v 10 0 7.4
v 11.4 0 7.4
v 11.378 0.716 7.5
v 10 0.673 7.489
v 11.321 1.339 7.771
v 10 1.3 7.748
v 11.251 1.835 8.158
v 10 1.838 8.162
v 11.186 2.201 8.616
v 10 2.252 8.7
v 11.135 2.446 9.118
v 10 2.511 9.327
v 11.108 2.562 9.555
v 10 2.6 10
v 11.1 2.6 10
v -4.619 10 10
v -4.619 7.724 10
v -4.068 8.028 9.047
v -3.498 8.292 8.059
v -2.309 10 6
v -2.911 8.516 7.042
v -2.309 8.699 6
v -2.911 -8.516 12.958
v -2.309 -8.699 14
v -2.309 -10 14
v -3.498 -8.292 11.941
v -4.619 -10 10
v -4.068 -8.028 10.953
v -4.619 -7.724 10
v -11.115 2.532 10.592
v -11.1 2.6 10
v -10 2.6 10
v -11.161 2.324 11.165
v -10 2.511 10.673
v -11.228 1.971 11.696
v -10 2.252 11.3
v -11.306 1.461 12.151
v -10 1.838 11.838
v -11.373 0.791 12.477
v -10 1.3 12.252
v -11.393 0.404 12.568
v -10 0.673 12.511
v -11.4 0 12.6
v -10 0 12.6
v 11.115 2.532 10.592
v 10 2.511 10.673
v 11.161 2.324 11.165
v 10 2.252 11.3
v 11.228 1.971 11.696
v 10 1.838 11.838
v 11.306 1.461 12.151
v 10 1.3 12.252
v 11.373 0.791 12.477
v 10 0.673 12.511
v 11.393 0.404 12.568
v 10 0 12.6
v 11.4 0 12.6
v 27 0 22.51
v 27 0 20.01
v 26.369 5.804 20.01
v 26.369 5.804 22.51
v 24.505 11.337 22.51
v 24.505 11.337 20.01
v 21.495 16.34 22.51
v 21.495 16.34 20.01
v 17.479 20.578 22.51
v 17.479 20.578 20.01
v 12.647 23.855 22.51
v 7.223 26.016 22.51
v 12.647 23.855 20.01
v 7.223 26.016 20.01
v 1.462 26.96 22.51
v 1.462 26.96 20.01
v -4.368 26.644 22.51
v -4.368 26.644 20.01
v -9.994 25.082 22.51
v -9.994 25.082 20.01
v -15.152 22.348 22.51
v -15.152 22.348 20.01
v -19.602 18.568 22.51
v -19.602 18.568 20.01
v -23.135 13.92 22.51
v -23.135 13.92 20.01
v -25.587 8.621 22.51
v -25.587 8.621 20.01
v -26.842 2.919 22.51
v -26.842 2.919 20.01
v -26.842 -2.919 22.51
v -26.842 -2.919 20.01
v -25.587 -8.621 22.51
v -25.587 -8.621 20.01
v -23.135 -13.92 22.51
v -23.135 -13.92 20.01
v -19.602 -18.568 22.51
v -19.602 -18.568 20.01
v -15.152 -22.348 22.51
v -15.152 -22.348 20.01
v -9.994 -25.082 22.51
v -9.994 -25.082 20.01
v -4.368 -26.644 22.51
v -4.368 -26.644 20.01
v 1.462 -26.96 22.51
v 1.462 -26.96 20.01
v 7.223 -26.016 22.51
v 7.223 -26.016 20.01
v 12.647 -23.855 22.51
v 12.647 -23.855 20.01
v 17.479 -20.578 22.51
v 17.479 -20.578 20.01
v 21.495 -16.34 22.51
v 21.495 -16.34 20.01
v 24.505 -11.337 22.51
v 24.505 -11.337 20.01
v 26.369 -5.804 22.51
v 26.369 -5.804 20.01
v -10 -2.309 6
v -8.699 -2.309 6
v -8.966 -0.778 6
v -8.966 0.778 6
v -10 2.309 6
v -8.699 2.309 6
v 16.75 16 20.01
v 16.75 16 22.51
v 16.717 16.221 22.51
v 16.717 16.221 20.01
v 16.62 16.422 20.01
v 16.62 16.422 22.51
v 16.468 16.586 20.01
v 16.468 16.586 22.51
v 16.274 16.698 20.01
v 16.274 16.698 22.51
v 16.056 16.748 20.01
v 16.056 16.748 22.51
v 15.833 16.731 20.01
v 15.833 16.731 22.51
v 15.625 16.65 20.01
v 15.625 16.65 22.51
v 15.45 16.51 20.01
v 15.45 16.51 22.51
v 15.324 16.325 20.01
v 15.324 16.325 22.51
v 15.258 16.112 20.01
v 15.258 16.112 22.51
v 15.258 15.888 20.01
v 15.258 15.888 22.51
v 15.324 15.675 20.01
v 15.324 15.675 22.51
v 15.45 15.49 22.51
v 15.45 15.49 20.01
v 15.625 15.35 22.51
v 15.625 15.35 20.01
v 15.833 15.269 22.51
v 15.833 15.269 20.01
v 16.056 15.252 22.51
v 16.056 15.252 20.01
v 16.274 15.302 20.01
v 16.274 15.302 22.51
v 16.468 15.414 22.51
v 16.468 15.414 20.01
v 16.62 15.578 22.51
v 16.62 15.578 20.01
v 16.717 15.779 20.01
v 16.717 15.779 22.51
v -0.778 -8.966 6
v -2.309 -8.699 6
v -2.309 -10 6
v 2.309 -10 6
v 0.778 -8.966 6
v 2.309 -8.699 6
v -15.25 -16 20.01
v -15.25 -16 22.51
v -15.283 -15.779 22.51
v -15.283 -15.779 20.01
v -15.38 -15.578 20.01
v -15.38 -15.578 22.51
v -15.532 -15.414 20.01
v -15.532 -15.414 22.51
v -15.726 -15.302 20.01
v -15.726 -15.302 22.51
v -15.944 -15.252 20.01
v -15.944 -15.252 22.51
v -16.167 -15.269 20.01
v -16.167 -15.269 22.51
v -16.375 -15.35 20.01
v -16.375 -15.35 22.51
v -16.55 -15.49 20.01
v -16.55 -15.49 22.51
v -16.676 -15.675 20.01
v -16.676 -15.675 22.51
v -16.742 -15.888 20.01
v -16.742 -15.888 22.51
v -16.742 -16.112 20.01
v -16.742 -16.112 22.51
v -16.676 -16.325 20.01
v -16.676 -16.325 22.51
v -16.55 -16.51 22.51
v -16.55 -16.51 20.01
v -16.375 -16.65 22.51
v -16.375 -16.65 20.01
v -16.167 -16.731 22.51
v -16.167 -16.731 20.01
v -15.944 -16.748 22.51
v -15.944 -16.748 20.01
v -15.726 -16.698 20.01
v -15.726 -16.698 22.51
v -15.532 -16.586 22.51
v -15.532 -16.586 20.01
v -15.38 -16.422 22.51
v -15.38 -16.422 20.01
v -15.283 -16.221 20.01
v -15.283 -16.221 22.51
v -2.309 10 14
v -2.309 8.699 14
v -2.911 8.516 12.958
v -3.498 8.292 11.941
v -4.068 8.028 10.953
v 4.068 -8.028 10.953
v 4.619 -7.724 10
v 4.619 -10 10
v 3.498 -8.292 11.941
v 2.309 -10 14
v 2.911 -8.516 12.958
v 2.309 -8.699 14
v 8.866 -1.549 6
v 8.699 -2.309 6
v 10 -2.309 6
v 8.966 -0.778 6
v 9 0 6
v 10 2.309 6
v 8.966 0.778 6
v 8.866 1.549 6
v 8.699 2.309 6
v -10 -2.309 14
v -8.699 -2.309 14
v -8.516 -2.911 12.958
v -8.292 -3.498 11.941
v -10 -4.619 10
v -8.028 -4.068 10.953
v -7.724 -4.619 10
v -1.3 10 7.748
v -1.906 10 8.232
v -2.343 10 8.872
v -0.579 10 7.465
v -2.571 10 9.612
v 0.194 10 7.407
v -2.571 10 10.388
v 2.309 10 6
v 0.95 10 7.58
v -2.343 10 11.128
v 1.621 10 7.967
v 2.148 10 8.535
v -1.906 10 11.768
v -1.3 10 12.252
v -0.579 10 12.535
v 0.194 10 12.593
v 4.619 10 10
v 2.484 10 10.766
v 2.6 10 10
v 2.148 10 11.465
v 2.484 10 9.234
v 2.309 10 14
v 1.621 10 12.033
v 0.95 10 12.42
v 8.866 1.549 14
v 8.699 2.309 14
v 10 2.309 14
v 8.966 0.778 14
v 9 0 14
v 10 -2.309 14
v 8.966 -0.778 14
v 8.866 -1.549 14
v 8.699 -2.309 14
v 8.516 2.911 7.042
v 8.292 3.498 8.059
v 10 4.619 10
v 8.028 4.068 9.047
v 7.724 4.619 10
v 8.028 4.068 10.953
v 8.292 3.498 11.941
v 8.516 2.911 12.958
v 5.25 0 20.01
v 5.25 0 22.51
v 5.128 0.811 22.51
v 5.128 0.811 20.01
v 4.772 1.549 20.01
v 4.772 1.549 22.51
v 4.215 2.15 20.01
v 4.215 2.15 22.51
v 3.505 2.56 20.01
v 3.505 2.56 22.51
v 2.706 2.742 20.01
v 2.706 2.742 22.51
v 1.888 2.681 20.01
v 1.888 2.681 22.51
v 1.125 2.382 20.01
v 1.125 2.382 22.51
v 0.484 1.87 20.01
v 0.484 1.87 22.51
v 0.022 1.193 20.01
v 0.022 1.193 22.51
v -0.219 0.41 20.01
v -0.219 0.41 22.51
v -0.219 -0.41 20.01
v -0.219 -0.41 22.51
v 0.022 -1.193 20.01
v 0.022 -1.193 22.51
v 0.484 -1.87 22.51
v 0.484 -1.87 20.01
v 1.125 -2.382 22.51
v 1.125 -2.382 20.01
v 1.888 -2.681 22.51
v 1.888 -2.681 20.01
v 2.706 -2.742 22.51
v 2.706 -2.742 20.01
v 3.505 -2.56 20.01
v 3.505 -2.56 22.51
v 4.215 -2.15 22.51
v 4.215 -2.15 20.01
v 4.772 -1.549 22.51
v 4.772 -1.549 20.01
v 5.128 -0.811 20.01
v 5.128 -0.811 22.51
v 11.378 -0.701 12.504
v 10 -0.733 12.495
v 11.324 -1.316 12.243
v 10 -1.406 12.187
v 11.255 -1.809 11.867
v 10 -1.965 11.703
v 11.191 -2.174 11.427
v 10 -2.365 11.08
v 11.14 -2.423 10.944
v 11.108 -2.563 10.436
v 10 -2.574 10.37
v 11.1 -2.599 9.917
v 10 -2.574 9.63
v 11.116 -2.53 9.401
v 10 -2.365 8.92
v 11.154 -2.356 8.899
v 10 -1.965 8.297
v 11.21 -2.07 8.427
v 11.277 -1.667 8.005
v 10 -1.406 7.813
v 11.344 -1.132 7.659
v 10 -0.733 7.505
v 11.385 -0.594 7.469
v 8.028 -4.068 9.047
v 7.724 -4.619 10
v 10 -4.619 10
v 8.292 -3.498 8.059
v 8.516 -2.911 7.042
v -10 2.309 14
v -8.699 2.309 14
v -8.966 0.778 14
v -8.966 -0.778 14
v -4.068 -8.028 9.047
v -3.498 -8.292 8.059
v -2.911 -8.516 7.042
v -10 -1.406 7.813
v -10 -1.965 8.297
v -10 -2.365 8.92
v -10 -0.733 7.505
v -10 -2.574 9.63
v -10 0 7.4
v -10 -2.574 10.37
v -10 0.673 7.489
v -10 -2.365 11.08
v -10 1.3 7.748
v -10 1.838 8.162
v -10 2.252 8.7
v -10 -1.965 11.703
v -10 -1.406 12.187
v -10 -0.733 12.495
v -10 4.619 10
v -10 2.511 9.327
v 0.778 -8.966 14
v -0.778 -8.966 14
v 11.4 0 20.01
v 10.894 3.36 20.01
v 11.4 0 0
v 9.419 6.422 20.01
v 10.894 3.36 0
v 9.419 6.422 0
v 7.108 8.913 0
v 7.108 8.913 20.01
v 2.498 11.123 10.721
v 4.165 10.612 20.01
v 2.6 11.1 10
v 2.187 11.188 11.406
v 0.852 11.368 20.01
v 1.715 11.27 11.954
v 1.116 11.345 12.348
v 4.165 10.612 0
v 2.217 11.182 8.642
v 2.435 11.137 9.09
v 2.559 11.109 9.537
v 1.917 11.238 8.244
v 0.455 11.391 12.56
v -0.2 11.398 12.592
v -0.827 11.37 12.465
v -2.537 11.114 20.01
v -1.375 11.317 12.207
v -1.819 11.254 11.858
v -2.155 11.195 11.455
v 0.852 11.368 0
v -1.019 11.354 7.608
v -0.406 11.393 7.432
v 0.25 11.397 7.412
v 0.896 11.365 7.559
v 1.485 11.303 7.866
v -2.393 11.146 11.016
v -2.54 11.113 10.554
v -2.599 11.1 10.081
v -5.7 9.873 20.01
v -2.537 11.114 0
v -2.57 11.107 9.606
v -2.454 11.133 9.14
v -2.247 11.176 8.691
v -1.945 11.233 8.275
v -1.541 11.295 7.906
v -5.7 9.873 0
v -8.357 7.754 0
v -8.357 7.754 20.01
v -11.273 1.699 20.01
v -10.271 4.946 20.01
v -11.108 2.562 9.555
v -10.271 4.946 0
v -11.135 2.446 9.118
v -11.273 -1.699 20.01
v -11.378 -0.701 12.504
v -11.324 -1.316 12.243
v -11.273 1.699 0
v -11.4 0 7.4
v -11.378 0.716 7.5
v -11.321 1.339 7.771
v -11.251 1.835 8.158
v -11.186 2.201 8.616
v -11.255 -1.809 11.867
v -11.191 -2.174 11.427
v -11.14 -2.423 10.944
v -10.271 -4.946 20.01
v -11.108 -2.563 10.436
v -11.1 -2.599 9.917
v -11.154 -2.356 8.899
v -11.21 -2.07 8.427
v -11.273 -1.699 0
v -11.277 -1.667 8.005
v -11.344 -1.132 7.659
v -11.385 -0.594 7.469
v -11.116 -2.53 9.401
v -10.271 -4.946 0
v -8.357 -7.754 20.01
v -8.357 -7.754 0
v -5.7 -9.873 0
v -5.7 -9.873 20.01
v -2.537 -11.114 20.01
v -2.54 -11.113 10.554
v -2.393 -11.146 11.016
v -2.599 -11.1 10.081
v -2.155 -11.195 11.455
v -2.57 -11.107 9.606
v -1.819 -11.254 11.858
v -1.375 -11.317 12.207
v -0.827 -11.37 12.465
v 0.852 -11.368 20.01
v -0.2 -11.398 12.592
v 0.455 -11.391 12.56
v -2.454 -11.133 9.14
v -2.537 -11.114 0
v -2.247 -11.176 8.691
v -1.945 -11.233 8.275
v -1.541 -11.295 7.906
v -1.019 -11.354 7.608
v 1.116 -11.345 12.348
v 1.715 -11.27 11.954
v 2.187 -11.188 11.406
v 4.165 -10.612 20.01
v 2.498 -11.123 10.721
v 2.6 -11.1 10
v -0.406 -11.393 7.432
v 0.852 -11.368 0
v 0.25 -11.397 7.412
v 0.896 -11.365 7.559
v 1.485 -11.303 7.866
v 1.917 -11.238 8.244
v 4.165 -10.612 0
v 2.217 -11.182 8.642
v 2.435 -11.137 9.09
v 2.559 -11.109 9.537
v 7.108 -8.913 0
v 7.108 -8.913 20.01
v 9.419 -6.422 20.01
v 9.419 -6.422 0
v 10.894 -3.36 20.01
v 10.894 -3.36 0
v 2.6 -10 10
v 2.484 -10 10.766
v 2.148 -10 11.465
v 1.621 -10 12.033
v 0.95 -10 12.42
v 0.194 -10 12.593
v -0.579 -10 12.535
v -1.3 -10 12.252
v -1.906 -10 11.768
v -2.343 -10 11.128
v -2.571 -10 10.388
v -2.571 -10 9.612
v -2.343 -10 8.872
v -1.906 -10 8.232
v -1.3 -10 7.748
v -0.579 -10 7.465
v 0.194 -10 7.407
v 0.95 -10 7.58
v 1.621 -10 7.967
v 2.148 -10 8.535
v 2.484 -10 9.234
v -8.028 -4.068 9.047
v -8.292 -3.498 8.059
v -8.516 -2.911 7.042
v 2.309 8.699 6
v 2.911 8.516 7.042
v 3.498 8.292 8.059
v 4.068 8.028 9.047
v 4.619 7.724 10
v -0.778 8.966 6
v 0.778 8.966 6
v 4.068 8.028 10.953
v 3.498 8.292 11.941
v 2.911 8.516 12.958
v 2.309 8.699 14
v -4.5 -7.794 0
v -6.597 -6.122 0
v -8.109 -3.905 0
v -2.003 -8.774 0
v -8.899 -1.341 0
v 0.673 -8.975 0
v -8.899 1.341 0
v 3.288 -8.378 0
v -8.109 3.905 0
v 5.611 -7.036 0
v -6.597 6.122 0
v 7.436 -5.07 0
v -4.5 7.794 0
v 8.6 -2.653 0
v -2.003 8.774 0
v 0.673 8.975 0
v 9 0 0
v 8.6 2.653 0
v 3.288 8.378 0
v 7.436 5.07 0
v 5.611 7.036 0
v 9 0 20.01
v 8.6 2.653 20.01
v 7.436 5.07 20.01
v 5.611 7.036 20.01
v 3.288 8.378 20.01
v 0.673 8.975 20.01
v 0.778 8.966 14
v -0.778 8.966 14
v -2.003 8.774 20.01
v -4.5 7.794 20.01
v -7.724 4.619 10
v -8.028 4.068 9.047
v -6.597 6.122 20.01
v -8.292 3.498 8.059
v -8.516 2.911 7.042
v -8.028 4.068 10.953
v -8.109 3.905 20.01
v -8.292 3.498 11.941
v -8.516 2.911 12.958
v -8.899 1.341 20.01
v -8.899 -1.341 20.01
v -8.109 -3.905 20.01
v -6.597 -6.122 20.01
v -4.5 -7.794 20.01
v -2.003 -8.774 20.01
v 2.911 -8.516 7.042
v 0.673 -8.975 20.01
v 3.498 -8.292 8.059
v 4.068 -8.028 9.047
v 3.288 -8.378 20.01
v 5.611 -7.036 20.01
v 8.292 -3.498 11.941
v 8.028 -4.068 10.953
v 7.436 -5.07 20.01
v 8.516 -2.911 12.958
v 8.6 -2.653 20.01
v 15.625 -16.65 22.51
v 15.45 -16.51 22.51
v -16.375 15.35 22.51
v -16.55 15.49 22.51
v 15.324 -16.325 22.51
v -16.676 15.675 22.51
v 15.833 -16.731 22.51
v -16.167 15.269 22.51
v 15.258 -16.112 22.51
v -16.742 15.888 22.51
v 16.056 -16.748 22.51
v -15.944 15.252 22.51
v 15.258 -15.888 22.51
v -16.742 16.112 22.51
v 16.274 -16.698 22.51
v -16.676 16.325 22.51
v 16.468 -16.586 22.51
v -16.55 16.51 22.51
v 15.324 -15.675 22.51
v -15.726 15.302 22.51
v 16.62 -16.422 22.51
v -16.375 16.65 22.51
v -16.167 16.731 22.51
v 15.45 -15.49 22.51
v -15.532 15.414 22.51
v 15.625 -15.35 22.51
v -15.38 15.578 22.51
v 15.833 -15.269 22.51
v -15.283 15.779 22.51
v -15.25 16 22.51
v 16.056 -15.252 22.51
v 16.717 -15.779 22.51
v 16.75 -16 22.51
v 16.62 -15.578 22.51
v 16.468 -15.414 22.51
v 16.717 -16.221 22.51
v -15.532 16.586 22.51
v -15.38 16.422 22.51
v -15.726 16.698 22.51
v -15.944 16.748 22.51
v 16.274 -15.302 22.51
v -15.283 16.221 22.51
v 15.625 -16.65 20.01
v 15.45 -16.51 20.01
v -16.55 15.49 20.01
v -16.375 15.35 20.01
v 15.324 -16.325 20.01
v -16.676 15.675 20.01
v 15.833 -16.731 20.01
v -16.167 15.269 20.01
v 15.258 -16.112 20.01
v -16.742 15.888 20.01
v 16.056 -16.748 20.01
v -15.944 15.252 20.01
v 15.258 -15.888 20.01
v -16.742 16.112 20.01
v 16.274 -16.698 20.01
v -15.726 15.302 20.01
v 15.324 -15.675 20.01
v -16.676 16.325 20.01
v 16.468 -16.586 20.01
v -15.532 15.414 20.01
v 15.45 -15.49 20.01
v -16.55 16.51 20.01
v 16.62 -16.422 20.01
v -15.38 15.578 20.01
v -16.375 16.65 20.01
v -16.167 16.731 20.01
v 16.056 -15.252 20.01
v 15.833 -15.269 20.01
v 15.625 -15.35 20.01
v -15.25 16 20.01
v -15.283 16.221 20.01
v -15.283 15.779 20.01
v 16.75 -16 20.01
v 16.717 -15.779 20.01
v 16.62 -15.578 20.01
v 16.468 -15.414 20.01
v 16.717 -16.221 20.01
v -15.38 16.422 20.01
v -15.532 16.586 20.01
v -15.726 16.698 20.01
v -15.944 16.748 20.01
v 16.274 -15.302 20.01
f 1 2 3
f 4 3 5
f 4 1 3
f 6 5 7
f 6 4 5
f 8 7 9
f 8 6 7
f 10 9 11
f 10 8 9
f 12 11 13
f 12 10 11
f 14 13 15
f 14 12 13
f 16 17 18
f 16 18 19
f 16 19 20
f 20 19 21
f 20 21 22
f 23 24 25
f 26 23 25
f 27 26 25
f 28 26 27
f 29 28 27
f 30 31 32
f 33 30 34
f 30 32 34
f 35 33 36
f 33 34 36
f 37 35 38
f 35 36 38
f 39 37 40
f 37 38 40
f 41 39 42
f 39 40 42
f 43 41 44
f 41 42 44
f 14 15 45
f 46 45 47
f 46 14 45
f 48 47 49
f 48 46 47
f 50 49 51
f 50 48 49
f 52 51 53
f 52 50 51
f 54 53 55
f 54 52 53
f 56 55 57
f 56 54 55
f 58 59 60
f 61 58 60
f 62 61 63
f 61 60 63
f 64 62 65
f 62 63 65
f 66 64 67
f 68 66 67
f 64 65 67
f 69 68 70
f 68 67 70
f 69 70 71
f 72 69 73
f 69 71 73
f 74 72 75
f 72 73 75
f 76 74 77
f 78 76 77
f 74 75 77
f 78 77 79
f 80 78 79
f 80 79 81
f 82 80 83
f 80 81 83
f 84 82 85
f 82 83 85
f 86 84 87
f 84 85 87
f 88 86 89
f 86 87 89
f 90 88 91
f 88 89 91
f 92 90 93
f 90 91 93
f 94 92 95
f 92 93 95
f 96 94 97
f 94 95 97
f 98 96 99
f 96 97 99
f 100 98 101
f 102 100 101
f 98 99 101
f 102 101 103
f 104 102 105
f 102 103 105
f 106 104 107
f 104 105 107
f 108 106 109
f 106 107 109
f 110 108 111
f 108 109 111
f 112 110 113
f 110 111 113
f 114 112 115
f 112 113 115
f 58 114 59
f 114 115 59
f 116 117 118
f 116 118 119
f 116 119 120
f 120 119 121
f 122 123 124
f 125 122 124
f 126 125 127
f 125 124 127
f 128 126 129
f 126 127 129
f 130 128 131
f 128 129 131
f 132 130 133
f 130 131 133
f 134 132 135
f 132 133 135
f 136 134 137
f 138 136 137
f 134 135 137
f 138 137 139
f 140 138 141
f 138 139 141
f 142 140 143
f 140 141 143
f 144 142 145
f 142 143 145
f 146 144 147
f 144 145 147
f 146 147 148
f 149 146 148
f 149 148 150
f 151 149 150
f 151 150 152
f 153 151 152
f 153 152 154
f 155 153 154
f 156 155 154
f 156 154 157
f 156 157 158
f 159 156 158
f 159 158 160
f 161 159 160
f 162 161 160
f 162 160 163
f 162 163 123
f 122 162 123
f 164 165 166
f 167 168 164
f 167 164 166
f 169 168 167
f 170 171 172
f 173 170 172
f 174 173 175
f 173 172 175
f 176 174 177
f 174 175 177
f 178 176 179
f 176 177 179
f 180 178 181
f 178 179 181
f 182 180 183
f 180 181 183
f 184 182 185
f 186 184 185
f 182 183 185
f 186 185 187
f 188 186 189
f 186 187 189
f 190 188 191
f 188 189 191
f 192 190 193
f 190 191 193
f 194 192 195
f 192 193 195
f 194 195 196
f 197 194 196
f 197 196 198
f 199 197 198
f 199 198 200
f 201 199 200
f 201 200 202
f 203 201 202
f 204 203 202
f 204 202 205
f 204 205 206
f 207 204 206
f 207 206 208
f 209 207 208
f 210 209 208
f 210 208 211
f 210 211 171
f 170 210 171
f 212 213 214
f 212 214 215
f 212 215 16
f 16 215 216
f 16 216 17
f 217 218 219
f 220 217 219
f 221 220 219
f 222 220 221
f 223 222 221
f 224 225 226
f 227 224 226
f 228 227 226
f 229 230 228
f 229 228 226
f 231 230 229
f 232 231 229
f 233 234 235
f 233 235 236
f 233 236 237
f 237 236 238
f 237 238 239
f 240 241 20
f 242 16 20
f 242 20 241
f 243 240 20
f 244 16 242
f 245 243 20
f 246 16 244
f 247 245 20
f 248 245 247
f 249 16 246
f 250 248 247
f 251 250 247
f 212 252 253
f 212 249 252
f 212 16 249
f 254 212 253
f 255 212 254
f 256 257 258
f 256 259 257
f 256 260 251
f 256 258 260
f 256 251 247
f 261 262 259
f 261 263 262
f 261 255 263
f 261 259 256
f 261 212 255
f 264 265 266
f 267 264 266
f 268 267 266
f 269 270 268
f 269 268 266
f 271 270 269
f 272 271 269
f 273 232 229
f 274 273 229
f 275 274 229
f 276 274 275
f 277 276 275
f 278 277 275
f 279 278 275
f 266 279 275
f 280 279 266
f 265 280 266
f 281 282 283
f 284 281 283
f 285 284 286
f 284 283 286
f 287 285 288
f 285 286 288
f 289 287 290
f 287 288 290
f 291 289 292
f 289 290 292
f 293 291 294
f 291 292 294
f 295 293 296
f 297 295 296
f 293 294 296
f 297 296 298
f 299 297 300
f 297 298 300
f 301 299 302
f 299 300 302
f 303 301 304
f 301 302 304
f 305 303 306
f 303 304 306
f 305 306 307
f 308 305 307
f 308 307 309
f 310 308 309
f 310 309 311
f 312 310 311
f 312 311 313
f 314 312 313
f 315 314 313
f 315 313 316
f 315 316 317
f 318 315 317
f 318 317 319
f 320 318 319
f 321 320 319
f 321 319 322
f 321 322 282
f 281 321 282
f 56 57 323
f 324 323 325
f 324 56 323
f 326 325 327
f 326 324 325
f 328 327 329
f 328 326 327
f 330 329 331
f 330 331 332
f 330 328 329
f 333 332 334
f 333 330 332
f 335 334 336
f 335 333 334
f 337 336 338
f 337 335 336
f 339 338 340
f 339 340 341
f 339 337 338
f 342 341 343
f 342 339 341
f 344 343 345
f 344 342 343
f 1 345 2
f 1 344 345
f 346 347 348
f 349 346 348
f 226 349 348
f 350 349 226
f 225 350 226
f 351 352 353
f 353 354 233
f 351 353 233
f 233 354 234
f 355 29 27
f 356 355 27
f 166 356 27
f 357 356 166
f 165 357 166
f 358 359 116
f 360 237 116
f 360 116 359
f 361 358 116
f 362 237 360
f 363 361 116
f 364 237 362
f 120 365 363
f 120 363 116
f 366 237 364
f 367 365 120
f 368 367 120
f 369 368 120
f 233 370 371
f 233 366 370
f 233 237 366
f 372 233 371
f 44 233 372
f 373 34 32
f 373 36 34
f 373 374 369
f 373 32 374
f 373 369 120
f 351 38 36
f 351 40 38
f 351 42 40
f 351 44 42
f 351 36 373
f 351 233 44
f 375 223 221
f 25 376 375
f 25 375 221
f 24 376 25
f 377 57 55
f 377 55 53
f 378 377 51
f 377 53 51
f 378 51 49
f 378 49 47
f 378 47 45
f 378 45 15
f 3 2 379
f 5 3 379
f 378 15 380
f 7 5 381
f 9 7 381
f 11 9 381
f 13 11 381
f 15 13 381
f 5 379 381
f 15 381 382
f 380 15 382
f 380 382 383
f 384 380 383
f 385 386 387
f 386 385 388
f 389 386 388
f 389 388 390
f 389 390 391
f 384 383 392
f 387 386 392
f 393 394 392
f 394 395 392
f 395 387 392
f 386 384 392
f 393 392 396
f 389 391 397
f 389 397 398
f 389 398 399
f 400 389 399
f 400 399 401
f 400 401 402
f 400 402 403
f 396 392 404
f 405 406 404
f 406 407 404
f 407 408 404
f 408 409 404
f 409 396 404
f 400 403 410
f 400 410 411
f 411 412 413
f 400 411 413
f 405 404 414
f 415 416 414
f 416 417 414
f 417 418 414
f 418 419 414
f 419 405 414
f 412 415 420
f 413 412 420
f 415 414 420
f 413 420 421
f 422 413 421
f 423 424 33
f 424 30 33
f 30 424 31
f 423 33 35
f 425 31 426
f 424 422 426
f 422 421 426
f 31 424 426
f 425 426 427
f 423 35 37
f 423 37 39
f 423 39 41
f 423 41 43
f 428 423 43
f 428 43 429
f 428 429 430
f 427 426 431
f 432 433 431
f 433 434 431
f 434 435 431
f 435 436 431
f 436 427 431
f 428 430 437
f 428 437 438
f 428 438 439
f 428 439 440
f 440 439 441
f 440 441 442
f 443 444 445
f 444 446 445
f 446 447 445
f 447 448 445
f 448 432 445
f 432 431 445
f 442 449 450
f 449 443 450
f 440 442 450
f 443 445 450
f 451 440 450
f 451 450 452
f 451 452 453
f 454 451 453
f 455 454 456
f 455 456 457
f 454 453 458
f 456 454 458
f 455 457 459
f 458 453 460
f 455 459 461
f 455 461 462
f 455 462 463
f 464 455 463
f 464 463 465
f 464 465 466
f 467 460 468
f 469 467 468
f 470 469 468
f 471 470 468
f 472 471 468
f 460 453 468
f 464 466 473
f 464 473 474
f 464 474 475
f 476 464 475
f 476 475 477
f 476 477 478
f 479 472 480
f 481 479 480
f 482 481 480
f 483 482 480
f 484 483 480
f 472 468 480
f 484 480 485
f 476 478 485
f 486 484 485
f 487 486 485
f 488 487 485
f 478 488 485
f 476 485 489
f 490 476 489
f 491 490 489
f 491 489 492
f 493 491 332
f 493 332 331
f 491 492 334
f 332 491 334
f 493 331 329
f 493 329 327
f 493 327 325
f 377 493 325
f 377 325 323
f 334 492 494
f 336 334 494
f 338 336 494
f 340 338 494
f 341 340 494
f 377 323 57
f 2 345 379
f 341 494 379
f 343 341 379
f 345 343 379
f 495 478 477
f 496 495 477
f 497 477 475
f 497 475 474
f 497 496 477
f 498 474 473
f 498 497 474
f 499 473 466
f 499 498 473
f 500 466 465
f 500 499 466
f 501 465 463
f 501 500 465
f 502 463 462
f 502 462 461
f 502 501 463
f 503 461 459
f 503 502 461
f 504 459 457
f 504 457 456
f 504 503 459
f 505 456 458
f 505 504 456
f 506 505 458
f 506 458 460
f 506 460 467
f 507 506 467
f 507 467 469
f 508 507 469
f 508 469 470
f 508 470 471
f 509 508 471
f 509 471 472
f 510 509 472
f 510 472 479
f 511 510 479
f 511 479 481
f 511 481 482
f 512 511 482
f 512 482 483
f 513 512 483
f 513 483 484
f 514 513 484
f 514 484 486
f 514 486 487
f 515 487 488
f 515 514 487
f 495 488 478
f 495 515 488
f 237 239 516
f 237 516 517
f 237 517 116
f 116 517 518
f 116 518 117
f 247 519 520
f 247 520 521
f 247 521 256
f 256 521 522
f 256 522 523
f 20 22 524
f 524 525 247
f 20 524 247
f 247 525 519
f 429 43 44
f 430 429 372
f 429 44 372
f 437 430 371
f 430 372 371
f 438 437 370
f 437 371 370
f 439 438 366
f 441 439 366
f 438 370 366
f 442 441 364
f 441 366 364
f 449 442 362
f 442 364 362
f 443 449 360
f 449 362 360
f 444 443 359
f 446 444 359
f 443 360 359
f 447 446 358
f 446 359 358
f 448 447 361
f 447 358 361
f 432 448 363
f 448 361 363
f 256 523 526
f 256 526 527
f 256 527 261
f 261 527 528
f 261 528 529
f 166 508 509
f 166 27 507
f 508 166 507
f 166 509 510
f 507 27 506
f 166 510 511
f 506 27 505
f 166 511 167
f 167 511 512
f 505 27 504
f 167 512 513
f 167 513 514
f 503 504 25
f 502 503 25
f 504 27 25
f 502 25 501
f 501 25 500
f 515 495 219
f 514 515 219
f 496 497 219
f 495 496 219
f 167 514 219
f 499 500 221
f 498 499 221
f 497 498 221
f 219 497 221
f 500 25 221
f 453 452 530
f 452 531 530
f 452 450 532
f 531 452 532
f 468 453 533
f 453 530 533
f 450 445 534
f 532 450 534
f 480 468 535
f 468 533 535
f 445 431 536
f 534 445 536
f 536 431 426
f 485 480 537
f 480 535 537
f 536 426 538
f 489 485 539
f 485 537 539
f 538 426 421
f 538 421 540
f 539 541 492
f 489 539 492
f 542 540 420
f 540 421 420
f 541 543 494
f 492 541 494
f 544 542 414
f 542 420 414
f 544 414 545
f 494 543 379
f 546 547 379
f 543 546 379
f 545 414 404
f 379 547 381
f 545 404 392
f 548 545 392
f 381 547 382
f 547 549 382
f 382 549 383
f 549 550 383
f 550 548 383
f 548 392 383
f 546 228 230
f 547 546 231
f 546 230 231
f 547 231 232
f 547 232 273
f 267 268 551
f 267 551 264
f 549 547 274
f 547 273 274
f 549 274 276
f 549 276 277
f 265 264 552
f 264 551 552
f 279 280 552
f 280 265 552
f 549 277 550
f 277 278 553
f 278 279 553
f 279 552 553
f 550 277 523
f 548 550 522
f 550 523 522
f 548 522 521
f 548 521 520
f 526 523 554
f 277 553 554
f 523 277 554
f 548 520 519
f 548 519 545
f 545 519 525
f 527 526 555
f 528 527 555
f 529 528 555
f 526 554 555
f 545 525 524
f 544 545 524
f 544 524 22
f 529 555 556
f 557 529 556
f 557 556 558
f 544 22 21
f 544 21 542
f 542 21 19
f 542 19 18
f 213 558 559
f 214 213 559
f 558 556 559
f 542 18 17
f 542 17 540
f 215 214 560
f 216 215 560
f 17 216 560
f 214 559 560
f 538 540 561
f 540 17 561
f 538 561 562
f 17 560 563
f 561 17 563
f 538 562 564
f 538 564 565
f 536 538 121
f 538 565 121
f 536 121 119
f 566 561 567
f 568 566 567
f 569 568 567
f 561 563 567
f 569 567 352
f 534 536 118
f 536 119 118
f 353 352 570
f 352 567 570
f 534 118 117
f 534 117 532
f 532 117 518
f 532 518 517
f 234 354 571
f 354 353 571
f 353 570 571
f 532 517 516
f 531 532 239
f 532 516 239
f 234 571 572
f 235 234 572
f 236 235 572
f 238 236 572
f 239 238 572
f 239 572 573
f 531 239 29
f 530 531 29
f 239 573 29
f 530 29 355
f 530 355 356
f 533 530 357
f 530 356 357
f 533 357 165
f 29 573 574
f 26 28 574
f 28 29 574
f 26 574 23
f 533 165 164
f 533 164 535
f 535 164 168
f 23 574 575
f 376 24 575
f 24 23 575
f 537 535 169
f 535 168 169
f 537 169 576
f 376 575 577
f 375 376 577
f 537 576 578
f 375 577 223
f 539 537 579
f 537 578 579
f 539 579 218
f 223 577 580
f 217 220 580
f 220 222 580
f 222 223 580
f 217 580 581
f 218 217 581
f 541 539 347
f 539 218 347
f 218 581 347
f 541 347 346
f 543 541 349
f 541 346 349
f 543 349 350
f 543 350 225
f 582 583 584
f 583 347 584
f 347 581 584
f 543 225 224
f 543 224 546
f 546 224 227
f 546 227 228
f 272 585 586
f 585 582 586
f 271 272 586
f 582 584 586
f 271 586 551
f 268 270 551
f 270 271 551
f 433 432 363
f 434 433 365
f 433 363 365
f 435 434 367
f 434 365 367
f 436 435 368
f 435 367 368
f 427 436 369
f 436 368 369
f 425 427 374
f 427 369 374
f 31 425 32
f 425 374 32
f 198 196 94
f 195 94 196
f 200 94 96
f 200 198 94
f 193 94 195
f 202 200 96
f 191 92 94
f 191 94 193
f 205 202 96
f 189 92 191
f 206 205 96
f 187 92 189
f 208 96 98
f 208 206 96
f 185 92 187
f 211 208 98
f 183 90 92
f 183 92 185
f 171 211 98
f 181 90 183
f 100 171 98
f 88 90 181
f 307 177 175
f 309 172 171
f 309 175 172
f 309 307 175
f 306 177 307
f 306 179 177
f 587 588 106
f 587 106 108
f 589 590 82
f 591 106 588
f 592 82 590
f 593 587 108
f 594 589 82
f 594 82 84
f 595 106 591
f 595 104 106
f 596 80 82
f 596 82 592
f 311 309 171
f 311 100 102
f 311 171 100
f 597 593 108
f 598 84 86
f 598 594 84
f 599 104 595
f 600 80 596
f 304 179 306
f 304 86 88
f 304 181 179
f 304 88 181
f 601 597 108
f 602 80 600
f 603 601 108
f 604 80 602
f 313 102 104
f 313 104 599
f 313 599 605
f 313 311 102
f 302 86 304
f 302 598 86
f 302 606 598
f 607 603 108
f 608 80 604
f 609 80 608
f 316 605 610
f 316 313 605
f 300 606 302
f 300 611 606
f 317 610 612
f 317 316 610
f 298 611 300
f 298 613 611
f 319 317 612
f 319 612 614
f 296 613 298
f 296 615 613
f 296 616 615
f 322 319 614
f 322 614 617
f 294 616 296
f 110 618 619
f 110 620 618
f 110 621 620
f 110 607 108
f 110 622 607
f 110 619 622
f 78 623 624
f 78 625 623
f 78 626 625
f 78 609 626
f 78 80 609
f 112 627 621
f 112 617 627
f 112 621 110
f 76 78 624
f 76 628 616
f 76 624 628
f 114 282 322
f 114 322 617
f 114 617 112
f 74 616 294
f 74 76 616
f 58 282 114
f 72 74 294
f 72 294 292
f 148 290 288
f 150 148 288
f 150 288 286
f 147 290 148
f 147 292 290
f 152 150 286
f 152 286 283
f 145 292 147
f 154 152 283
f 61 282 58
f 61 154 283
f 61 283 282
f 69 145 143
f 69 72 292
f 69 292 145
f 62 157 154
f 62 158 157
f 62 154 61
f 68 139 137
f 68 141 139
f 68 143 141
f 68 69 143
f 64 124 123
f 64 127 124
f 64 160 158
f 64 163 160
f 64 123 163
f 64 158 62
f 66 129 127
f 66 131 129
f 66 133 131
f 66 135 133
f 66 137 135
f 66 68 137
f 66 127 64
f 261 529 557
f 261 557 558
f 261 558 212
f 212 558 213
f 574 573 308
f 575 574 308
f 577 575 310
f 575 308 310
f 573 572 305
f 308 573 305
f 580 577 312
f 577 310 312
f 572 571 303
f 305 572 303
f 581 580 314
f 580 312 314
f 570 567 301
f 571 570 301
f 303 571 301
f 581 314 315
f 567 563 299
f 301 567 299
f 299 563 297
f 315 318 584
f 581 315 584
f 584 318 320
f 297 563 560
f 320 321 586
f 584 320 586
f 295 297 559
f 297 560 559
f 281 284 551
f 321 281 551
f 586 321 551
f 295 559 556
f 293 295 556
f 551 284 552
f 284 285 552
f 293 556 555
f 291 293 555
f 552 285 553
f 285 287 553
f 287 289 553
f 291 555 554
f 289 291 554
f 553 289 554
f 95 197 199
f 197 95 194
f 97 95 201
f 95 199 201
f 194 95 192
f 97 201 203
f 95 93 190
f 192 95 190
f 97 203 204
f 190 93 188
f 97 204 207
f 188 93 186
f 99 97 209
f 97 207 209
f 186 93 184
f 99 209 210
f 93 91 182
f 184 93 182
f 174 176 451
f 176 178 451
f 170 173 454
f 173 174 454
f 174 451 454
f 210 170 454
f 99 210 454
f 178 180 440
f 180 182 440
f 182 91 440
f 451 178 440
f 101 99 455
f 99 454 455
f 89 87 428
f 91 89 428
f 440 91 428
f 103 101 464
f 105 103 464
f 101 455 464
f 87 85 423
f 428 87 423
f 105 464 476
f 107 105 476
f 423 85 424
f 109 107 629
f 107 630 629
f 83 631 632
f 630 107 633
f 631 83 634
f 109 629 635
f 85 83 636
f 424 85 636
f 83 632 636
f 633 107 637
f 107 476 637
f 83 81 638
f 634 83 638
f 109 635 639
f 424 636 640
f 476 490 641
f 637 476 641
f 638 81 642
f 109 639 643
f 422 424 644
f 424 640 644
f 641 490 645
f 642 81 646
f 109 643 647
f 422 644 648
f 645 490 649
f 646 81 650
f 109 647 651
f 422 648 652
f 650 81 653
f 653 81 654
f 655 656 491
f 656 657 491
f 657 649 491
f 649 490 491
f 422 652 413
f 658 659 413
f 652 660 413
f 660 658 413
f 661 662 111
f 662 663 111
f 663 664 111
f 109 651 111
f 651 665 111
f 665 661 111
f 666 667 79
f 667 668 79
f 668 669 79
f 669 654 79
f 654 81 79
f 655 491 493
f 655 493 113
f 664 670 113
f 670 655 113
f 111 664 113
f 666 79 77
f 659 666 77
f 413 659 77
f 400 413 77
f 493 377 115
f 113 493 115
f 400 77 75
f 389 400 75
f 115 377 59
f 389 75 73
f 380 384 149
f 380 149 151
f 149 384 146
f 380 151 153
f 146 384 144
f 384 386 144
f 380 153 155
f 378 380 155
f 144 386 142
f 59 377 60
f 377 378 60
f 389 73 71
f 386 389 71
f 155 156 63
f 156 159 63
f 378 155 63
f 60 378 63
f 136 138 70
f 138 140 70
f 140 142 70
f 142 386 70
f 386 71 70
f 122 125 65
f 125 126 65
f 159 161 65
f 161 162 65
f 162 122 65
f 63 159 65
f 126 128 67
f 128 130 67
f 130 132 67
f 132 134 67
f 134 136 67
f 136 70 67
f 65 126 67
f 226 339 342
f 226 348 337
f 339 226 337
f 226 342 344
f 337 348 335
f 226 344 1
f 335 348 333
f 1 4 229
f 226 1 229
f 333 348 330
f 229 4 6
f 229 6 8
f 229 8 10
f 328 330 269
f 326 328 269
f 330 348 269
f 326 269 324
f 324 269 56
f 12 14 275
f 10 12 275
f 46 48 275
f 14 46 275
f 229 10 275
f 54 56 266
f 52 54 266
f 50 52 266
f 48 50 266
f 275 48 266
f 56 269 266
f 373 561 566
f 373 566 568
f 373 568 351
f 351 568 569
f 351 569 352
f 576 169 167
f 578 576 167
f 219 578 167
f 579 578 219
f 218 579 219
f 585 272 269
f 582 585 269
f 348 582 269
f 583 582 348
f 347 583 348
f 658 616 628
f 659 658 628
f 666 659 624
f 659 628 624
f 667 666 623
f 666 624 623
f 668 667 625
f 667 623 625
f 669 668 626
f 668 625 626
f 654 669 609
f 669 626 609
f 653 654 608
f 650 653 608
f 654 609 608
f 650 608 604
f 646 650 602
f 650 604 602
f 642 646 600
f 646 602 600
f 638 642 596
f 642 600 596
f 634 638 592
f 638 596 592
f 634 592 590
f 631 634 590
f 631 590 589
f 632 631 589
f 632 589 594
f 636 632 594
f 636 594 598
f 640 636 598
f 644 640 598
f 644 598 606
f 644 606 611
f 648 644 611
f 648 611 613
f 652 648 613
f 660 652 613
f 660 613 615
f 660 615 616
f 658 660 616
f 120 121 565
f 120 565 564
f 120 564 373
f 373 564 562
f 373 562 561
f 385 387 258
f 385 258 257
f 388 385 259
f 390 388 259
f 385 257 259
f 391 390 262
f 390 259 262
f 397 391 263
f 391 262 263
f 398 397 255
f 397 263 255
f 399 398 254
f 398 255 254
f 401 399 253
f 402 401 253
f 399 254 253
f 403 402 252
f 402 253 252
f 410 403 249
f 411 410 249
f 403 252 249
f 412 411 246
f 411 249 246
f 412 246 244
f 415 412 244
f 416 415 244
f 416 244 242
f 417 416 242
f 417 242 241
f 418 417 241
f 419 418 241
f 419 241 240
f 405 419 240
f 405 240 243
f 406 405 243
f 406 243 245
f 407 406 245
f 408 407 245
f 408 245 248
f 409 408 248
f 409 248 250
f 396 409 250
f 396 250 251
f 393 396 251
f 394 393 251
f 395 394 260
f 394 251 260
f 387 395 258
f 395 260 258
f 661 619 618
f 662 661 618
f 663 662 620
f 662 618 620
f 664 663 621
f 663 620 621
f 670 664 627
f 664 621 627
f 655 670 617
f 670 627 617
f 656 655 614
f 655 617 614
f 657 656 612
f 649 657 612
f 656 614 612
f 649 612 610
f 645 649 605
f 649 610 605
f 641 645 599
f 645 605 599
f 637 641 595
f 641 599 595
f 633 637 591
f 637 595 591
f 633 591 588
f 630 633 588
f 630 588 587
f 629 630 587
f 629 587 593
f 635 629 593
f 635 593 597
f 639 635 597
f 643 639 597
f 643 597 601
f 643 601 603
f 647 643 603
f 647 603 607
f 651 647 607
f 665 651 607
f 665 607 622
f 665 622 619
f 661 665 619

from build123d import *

# Parameters (mm, degrees)
F0_R           = 11.4
F1_DEPTH       = 0.01
F2_R           = 11.4
F2_R_2         = 9
F3_DEPTH       = 20
F5_DEPTH       = 10
F5_DEPTH_BACK  = 10
F7_DEPTH       = 10
F7_DEPTH_BACK  = 10
F9_DEPTH       = 11.401
F9_DEPTH_BACK  = 11.401
F10_R          = 2.6
F11_DEPTH      = 11.4010001
F11_DEPTH_BACK = 11.4010001
F12_R          = 9
F13_DEPTH      = 10
F14_R          = 27
F15_DEPTH      = 2.5
F16_R          = 2.75
F17_DEPTH      = 25
F18_R          = 0.75
F19_DEPTH      = 25


with BuildPart() as f1:
    # F0 (on Top) → F1 (new body)
    with BuildSketch(Plane.XY):
        Circle(F0_R)
    extrude(amount=F1_DEPTH)

    # F2 (on face) → F3 (join)
    with BuildSketch(Plane.XY.offset(0.01)):
        Circle(F2_R)
        Circle(F2_R_2, mode=Mode.SUBTRACT)
    extrude(amount=F3_DEPTH)

    # F4 (on Right) → F5 (cut, two sides)
    with BuildSketch(Plane.YZ) as f5_sk:
        Polygon((-2.3094010768, 6), (2.3094010768, 6), (4.6188021535, 10), (2.3094010768, 14), (-2.3094010768, 14), (-4.6188021535, 10), align=None)
    extrude(amount=F5_DEPTH, mode=Mode.SUBTRACT)
    extrude(f5_sk.sketch, amount=-F5_DEPTH_BACK, mode=Mode.SUBTRACT)

    # F6 (on Front) → F7 (cut, two sides)
    with BuildSketch(Plane.XZ) as f7_sk:
        Polygon((-2.3094010768, 6), (2.3094010768, 6), (4.6188021535, 10), (2.3094010768, 14), (-2.3094010768, 14), (-4.6188021535, 10), align=None)
    extrude(amount=F7_DEPTH, mode=Mode.SUBTRACT)
    extrude(f7_sk.sketch, amount=-F7_DEPTH_BACK, mode=Mode.SUBTRACT)

    # F8 (on Right) → F9 (cut, two sides)
    with BuildSketch(Plane.YZ) as f9_sk:
        with BuildLine():
            ThreePointArc((0, 12.6), (-2.6, 10), (0, 7.4))
            Line((0, 7.4), (0, 12.6))
        make_face()
        with BuildLine():
            Line((0, 12.6), (0, 7.4))
            ThreePointArc((0, 7.4), (1.8384776311, 8.1615223689), (2.6, 10))
            ThreePointArc((2.6, 10), (1.8384776311, 11.8384776311), (0, 12.6))
        make_face()
    extrude(amount=-F9_DEPTH, mode=Mode.SUBTRACT)
    extrude(f9_sk.sketch, amount=F9_DEPTH_BACK, mode=Mode.SUBTRACT)

    # F10 (on Front) → F11 (cut, two sides)
    with BuildSketch(Plane.XZ) as f11_sk:
        with Locations((0, 10)):
            Circle(F10_R)
    extrude(amount=F11_DEPTH, mode=Mode.SUBTRACT)
    extrude(f11_sk.sketch, amount=-F11_DEPTH_BACK, mode=Mode.SUBTRACT)

    # F12 (on face) → F13 (cut)
    with BuildSketch(Plane.XY.offset(0.01)):
        Circle(F12_R)
    extrude(amount=-F13_DEPTH, mode=Mode.SUBTRACT)

    # F14 (on face) → F15 (join)
    with BuildSketch(Plane.XY.offset(20.01)):
        Circle(F14_R)
    extrude(amount=F15_DEPTH)

    # F16 (on face) → F17 (cut)
    with BuildSketch(Plane.XY.offset(22.51)):
        with Locations((2.5, 0)):
            Circle(F16_R)
    extrude(amount=-F17_DEPTH, mode=Mode.SUBTRACT)

    # F18 (on face) → F19 (cut)
    with BuildSketch(Plane.XY.offset(22.51)):
        with Locations((-16, -16)):
            Circle(F18_R)
        with Locations((16, -16)):
            Circle(F18_R)
        with Locations((-16, 16)):
            Circle(F18_R)
        with Locations((16, 16)):
            Circle(F18_R)
    extrude(amount=-F19_DEPTH, mode=Mode.SUBTRACT)


solid = f1.part
